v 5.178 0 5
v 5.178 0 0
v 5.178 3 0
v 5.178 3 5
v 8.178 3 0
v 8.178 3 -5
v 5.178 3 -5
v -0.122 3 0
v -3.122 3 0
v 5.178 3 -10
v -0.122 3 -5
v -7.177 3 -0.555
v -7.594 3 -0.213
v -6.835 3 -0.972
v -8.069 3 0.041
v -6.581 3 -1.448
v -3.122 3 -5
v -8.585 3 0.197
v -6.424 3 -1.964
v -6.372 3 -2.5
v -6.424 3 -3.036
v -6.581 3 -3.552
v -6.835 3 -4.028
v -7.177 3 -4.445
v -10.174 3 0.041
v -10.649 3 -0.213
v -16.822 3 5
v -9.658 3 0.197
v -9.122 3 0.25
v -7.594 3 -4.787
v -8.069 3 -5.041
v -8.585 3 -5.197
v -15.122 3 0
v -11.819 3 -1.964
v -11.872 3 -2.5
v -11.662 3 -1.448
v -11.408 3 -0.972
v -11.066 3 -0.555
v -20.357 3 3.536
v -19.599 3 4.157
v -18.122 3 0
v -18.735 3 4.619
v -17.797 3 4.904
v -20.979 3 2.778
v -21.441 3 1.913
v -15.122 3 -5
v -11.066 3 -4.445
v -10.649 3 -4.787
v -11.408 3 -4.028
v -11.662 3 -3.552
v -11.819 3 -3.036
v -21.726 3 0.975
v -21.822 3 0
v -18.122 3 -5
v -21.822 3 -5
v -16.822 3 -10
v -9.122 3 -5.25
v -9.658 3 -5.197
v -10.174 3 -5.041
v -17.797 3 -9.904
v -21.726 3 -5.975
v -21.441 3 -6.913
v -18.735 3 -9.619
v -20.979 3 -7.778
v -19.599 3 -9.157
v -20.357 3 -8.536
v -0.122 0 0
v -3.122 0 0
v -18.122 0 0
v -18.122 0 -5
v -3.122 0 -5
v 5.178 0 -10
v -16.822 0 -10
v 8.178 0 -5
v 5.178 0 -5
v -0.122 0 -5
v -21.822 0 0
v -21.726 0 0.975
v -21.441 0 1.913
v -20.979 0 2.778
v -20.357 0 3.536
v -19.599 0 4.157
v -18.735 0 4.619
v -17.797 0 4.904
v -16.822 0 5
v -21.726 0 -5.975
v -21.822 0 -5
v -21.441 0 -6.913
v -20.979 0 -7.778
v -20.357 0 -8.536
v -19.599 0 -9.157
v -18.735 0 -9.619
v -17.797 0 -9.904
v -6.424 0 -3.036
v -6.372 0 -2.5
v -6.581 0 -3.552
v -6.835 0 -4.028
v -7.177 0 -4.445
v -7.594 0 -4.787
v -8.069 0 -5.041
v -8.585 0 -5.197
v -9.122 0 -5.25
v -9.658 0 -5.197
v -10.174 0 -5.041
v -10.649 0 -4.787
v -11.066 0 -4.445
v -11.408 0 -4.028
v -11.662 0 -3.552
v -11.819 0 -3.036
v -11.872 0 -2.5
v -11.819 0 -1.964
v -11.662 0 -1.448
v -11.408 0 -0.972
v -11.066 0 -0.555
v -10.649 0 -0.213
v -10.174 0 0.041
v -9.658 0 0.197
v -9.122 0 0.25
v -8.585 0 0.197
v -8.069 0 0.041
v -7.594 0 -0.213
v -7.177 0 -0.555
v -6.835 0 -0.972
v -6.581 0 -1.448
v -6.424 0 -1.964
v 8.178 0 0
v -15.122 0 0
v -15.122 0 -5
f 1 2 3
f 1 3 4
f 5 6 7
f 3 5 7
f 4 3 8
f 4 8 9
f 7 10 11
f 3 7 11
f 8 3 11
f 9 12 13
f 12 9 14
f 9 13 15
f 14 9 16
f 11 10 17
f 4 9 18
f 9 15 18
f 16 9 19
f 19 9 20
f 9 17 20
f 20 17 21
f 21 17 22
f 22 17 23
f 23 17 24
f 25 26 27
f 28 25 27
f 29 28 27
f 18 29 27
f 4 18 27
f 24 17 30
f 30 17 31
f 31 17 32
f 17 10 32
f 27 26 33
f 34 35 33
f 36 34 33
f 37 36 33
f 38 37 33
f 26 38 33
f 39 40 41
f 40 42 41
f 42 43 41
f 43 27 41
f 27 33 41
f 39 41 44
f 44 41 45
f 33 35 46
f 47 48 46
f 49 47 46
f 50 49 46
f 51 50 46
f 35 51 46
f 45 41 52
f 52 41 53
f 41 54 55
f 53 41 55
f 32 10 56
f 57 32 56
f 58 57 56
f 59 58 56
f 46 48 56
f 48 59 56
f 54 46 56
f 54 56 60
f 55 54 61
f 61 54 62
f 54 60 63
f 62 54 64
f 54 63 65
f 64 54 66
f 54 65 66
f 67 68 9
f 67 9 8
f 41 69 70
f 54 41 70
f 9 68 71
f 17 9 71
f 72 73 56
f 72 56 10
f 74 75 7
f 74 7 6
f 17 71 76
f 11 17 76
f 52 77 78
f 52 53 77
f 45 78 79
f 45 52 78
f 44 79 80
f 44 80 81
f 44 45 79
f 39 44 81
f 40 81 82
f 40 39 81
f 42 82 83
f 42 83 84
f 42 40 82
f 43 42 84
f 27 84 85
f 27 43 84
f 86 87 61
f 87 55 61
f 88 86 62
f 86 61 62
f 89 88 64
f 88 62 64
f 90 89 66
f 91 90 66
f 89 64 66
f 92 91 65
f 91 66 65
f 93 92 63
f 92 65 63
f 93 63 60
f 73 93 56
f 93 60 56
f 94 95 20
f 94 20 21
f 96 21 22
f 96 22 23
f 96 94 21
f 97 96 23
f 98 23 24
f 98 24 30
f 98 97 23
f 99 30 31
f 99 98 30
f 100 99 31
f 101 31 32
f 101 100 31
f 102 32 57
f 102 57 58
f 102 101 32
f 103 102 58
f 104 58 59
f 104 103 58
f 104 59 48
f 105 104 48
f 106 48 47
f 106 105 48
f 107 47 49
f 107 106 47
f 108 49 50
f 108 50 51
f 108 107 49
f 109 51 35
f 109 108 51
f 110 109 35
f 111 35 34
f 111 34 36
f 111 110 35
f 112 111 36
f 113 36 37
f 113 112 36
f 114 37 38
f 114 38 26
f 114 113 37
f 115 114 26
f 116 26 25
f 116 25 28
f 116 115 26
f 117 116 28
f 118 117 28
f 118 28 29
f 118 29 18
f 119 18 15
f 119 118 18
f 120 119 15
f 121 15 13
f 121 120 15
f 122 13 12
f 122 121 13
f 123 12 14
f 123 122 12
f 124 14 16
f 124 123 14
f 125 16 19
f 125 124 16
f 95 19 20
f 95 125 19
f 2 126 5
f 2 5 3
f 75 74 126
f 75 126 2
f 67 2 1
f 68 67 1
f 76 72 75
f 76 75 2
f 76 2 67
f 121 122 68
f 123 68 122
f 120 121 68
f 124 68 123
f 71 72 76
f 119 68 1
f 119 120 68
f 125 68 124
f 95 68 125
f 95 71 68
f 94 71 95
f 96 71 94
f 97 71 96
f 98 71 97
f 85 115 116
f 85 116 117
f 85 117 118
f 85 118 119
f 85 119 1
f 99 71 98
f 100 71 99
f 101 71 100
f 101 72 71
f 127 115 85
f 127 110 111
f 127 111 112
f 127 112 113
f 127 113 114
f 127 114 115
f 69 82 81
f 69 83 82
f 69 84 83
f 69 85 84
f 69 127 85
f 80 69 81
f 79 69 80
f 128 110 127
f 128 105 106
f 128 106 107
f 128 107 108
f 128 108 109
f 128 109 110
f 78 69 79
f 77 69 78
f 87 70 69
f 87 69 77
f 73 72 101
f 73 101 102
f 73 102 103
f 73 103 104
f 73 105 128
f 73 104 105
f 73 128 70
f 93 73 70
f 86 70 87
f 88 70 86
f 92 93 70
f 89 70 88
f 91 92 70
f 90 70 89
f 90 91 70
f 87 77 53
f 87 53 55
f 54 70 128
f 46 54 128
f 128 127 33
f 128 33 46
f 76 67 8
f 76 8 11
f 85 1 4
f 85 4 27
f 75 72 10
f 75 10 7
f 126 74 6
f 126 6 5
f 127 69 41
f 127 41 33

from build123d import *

# Parameters (mm, degrees)
SKETCH1_R           = 2.75
SKETCH1_W           = 3
SKETCH1_H           = 5
BOSS_EXTRUDE1_DEPTH = 3
FILLET1_R           = 5


with BuildPart() as part:
    # Sketch1 → Boss-Extrude1 (new body)
    with BuildSketch(Plane(origin=(0, 0, 0), x_dir=(1, 0, 0), z_dir=(0, 1, 0))):
        Polygon((-21.821592901, -5), (-21.821592901, 10), (5.178407099, 10), (5.178407099, 5), (8.178407099, 5), (8.178407099, 0), (5.178407099, 0), (5.178407099, -5), align=None)
        with Locations((-9.121592901, 2.5)):
            Circle(SKETCH1_R, mode=Mode.SUBTRACT)
        with Locations((-16.621592901, 2.5)):
            Rectangle(SKETCH1_W, SKETCH1_H, mode=Mode.SUBTRACT)
        with Locations((-1.621592901, 2.5)):
            Rectangle(SKETCH1_W, SKETCH1_H, mode=Mode.SUBTRACT)
    extrude(amount=BOSS_EXTRUDE1_DEPTH)

    # Fillet1
    fillet1_edges = [part.edges().sort_by_distance(p)[0] for p in [
        (-21.821592901, 1.5, 5),
        (-21.821592901, 1.5, -10),
    ]]
    fillet(fillet1_edges, radius=FILLET1_R)


solid = part.part
